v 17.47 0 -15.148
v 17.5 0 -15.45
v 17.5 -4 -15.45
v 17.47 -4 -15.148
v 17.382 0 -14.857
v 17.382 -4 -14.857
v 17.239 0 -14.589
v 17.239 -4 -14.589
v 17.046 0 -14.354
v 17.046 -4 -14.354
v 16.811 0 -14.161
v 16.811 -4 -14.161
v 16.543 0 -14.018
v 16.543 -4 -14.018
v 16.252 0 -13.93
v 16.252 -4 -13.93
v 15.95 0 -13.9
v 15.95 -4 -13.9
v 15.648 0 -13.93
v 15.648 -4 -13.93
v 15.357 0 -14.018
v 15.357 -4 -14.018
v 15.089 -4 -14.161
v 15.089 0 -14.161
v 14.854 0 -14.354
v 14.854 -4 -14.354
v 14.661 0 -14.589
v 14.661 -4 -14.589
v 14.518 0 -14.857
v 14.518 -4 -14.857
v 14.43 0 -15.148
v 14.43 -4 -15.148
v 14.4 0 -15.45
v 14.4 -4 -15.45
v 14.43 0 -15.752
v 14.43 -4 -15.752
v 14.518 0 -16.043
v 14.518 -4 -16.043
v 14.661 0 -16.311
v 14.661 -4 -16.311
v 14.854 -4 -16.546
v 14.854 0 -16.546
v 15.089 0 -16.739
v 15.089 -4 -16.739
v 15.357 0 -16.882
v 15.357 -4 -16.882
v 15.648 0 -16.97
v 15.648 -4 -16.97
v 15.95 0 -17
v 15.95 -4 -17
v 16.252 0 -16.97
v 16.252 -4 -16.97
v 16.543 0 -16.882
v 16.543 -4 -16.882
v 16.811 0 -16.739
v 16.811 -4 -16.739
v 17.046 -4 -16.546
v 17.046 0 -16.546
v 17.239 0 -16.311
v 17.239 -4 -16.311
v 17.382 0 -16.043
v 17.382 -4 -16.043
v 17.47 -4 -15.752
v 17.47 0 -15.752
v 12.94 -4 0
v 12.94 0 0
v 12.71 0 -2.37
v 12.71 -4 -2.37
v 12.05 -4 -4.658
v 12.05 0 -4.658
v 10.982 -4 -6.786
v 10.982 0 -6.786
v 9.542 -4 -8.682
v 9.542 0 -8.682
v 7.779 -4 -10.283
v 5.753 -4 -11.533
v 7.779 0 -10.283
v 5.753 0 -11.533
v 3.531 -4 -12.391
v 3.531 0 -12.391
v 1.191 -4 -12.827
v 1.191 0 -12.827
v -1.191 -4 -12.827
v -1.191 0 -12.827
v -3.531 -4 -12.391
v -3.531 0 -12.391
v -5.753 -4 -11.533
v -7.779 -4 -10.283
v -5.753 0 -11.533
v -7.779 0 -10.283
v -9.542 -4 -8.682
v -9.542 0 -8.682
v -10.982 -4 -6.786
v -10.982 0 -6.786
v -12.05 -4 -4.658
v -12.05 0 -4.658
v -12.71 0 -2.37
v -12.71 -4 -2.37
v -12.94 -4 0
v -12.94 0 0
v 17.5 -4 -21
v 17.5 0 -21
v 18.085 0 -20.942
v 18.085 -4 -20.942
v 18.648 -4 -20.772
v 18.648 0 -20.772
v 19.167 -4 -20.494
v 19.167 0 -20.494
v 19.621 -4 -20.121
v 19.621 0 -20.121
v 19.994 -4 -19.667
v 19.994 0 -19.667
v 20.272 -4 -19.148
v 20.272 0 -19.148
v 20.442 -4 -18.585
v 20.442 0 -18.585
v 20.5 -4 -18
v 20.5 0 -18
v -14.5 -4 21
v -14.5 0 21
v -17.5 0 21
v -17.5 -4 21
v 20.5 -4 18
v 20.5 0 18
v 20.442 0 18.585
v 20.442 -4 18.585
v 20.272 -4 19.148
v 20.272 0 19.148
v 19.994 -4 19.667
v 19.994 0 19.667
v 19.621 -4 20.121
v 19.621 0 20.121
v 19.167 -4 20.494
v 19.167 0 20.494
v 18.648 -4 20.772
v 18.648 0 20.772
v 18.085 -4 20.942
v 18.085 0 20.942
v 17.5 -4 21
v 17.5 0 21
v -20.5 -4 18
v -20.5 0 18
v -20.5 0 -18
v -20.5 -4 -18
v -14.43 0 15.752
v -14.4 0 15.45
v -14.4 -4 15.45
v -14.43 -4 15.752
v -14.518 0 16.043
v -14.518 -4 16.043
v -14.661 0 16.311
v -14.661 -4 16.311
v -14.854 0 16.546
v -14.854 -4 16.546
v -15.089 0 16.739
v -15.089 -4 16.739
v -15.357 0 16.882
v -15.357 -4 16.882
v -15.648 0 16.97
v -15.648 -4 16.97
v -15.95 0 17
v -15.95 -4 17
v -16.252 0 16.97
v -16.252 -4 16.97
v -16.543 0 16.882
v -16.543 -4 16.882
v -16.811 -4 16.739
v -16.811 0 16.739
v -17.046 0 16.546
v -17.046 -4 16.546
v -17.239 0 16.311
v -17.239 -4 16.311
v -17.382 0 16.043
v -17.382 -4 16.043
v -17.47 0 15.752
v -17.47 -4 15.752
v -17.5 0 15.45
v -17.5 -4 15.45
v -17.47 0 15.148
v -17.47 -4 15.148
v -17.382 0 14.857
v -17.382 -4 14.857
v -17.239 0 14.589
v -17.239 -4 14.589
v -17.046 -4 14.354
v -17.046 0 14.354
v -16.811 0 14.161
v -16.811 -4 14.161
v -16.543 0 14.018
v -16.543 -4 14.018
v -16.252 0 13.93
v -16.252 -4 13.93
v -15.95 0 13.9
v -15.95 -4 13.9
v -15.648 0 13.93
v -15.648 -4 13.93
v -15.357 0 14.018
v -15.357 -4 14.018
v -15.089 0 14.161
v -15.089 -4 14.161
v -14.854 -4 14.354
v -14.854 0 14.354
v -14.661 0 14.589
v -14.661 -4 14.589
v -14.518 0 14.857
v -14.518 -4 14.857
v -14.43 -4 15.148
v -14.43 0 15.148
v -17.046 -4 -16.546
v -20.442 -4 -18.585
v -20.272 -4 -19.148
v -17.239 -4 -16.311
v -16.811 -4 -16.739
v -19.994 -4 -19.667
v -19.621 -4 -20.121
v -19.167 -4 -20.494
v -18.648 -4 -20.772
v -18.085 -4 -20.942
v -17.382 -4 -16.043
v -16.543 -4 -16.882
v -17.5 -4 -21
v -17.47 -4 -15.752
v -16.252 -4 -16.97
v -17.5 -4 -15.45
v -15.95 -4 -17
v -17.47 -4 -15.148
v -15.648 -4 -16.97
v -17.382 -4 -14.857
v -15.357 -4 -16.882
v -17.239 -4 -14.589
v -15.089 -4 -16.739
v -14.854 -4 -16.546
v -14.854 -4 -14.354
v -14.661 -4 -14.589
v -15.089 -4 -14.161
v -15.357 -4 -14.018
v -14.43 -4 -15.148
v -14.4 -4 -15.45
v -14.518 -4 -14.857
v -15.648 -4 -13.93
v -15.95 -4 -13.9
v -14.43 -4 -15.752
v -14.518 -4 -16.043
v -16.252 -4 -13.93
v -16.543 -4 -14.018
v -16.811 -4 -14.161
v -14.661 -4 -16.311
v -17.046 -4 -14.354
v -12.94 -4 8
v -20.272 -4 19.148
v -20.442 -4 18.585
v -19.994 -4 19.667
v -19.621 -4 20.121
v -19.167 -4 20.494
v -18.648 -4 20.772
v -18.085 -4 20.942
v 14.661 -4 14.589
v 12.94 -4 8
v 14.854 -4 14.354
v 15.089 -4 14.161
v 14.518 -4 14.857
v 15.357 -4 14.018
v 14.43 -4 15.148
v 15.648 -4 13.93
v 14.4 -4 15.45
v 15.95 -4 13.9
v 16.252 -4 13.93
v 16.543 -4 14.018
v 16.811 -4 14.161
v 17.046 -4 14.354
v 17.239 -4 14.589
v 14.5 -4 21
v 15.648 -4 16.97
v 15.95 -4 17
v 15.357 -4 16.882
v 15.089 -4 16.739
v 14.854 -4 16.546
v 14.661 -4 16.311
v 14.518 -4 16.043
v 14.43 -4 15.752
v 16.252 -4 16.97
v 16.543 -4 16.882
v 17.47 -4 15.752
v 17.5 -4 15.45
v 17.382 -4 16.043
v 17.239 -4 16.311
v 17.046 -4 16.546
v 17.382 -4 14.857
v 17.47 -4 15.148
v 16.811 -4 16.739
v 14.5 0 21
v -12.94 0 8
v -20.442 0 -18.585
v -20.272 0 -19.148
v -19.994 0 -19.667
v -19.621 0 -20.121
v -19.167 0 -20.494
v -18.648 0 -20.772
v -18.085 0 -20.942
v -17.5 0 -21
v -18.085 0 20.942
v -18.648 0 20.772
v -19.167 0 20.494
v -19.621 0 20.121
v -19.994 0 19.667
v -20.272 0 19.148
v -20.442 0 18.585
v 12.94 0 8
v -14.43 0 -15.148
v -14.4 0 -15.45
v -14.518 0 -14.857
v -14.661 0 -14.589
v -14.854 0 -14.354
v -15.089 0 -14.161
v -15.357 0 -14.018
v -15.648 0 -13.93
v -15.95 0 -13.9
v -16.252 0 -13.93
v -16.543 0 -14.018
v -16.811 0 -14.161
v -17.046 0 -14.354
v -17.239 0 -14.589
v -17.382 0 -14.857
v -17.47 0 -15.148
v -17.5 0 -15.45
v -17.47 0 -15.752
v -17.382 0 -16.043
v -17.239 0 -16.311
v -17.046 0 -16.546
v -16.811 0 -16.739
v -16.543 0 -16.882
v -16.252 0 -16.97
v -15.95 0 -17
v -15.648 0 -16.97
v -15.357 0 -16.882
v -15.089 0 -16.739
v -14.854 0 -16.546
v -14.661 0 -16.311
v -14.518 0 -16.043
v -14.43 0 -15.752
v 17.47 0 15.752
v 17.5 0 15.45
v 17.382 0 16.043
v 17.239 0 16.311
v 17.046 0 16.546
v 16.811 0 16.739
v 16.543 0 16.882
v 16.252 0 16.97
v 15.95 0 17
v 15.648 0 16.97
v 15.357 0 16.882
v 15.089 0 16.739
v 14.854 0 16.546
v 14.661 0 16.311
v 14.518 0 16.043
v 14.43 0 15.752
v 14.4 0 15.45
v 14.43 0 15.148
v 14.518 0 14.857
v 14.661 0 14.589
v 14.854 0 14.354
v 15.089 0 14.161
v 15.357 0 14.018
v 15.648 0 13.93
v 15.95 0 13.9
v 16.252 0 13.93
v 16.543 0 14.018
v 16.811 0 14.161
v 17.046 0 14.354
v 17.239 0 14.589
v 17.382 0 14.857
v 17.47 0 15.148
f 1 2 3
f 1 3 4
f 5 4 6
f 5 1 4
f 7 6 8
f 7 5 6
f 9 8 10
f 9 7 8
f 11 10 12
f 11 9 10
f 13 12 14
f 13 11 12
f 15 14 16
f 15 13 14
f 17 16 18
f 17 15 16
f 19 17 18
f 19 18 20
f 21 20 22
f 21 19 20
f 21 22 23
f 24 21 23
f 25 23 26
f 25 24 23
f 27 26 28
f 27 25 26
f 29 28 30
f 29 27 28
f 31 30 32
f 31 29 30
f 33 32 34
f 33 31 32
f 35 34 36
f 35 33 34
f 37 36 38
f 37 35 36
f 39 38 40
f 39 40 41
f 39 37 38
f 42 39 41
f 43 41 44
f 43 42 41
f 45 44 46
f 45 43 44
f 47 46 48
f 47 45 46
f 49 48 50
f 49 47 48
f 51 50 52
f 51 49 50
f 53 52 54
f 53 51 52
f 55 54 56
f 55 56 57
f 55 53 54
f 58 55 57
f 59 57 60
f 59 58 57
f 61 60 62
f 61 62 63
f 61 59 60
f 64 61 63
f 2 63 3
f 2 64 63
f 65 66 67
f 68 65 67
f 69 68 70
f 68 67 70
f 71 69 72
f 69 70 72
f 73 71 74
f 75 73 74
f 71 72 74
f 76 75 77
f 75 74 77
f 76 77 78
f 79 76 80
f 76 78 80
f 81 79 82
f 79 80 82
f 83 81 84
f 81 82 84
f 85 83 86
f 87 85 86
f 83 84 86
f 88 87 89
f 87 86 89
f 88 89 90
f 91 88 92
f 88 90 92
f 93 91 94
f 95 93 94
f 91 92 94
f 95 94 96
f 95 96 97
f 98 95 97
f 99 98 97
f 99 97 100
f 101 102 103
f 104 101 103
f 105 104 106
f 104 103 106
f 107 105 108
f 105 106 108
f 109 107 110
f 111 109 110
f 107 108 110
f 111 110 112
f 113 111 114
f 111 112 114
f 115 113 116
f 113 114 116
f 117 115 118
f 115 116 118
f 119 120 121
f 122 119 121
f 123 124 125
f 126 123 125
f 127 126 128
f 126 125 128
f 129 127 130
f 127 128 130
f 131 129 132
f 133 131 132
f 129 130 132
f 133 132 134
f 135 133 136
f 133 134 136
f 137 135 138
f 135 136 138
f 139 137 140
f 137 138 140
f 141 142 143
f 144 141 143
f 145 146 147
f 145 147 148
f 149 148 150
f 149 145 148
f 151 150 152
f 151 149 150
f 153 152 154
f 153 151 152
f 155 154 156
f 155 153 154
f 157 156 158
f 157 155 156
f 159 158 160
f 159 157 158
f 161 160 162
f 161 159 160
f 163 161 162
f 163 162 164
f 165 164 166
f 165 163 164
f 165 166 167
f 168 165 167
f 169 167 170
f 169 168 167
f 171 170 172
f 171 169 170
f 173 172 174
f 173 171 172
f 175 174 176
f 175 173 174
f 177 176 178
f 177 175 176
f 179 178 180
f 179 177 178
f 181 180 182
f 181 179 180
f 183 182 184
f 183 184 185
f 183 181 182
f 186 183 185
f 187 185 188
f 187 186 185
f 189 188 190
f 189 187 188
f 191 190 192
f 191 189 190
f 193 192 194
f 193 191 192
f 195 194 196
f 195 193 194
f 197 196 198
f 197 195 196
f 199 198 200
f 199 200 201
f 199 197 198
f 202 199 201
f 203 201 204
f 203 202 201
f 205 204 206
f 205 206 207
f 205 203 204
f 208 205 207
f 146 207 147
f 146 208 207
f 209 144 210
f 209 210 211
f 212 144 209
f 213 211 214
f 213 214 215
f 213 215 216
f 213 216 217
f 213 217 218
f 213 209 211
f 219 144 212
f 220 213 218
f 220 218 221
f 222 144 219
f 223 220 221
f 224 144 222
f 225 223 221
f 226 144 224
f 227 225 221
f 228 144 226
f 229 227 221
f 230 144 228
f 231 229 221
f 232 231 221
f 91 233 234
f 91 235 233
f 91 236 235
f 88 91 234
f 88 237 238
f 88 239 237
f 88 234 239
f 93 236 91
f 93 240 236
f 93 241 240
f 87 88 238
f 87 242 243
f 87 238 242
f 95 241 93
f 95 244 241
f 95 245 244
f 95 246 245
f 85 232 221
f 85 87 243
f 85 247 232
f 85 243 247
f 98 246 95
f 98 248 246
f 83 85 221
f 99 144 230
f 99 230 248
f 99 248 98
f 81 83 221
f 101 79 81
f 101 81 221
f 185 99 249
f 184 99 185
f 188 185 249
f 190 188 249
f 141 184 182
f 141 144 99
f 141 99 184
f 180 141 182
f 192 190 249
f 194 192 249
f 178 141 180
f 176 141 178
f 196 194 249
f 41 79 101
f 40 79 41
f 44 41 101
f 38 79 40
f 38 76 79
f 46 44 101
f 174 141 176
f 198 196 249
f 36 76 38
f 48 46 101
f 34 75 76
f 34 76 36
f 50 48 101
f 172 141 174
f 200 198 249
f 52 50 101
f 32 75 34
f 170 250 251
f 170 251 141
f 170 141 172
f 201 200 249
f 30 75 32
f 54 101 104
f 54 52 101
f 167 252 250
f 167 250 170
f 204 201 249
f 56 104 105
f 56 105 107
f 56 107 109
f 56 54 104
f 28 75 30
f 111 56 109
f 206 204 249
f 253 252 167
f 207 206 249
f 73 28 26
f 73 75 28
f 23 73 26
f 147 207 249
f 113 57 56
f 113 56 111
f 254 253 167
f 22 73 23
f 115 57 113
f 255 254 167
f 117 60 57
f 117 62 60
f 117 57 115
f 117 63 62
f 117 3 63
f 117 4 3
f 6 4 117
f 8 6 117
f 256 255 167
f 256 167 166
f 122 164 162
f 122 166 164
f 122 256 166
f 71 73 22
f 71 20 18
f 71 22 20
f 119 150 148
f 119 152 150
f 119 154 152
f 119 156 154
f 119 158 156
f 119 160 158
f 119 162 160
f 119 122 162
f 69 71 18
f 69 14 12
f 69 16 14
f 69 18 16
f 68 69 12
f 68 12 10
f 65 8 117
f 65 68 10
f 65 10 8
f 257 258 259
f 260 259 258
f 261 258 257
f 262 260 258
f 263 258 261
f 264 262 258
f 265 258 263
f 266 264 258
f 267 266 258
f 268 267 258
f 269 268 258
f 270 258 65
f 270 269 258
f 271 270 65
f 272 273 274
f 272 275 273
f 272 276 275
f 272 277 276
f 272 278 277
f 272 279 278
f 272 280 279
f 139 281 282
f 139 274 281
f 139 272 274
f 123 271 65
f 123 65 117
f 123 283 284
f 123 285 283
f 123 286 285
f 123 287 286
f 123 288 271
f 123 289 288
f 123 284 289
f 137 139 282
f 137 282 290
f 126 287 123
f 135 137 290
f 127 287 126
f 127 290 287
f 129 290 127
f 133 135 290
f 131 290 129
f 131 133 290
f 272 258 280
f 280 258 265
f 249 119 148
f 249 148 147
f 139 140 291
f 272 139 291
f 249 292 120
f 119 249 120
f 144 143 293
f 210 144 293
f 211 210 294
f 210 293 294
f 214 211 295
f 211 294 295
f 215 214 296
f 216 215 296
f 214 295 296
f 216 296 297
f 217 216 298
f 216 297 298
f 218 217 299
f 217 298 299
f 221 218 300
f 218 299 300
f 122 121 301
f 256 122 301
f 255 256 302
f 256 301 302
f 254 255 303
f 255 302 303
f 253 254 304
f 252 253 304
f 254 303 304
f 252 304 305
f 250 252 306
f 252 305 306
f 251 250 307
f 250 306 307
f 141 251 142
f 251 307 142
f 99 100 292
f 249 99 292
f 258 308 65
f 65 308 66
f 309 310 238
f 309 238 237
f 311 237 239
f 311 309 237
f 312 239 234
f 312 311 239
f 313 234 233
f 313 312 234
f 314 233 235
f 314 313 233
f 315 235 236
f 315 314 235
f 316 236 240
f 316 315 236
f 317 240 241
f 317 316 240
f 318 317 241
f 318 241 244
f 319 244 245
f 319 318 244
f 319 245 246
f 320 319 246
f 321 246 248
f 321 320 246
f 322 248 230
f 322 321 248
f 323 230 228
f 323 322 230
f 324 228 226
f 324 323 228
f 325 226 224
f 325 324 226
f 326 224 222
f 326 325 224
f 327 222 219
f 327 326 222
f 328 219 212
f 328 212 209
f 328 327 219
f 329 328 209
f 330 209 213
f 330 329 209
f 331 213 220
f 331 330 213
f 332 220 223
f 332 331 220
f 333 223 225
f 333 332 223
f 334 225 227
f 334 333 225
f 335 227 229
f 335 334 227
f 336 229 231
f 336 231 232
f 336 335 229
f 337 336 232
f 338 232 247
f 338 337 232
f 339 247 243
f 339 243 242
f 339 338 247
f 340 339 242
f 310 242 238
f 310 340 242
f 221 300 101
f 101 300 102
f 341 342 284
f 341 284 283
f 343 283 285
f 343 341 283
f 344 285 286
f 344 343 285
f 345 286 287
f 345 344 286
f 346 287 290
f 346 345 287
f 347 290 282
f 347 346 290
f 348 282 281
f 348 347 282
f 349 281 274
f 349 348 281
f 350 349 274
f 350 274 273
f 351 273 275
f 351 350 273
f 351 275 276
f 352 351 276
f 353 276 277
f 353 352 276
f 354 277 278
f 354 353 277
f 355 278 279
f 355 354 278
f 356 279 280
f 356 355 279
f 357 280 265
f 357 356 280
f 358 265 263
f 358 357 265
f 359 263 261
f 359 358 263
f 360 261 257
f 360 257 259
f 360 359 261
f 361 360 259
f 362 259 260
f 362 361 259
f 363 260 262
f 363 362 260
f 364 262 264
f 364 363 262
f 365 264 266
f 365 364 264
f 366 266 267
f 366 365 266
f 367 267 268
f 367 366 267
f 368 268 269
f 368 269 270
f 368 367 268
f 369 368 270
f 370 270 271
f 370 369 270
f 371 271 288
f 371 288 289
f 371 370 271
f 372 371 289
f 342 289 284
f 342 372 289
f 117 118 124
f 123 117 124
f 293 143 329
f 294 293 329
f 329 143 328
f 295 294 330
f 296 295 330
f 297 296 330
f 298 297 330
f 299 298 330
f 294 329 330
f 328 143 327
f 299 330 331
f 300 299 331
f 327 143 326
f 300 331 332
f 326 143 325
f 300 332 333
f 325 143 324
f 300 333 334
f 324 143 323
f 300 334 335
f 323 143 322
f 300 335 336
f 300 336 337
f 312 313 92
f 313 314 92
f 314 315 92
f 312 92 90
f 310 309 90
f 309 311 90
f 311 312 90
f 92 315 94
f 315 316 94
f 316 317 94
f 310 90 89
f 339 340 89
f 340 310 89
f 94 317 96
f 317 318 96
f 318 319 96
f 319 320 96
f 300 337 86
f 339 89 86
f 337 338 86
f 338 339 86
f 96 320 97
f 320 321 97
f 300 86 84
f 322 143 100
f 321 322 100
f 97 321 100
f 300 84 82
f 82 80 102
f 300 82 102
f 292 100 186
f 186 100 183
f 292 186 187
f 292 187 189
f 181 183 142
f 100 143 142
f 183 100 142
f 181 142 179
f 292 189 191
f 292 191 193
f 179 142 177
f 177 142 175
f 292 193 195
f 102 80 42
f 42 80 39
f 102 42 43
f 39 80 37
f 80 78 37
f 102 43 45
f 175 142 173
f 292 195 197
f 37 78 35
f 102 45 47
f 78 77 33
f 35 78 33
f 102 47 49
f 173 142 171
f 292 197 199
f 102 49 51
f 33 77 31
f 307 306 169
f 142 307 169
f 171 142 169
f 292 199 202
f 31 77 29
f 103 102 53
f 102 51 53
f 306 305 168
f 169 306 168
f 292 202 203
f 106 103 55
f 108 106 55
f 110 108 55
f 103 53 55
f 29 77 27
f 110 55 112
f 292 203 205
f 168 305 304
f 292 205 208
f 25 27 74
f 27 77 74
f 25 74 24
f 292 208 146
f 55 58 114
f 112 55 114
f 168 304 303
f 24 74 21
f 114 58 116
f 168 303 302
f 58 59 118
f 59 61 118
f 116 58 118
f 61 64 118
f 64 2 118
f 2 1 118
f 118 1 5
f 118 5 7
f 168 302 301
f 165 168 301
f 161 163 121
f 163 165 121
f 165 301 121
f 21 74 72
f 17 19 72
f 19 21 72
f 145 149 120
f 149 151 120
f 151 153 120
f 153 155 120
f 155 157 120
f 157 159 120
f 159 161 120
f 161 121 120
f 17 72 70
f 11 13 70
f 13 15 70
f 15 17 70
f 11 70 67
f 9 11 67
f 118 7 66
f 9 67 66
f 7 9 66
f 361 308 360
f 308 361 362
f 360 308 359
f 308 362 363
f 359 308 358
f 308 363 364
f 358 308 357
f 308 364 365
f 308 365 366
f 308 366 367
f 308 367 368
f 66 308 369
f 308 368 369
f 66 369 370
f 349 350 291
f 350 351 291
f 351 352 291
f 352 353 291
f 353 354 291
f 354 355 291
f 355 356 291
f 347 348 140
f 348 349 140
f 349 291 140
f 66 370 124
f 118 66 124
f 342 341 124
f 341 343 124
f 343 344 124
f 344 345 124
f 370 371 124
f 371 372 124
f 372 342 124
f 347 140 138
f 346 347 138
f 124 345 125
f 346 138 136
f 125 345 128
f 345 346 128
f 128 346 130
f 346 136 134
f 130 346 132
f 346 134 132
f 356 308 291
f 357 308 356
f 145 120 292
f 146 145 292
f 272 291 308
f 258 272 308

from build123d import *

# Parameters (mm, degrees)
F0_R     = 1.55
F1_DEPTH = 4


with BuildPart() as f1:
    # F0 (on Front) → F1 (new body)
    with BuildSketch(Plane.XZ):
        with BuildLine():
            Line((-14.5, 21), (-17.5, 21))
            ThreePointArc((-17.5, 21), (-19.62132, 20.12132), (-20.5, 18))
            Line((-20.5, 18), (-20.5, -18))
            ThreePointArc((-20.5, -18), (-19.62132, -20.12132), (-17.5, -21))
            Line((-17.5, -21), (17.5, -21))
            ThreePointArc((17.5, -21), (19.62132, -20.12132), (20.5, -18))
            Line((20.5, -18), (20.5, 18))
            ThreePointArc((20.5, 18), (19.62132, 20.12132), (17.5, 21))
            Line((17.5, 21), (14.5, 21))
            Line((14.5, 21), (12.94, 8))
            Line((12.94, 8), (12.94, 0))
            ThreePointArc((12.94, 0), (0, -12.882147), (-12.94, 0))
            Line((-12.94, 0), (-12.94, 8))
            Line((-12.94, 8), (-14.5, 21))
        make_face()
        with Locations((-15.95, -15.45)):
            Circle(F0_R, mode=Mode.SUBTRACT)
        with Locations((15.95, -15.45)):
            Circle(F0_R, mode=Mode.SUBTRACT)
        with Locations((-15.95, 15.45)):
            Circle(F0_R, mode=Mode.SUBTRACT)
        with Locations((15.95, 15.45)):
            Circle(F0_R, mode=Mode.SUBTRACT)
    extrude(amount=F1_DEPTH)


solid = f1.part
